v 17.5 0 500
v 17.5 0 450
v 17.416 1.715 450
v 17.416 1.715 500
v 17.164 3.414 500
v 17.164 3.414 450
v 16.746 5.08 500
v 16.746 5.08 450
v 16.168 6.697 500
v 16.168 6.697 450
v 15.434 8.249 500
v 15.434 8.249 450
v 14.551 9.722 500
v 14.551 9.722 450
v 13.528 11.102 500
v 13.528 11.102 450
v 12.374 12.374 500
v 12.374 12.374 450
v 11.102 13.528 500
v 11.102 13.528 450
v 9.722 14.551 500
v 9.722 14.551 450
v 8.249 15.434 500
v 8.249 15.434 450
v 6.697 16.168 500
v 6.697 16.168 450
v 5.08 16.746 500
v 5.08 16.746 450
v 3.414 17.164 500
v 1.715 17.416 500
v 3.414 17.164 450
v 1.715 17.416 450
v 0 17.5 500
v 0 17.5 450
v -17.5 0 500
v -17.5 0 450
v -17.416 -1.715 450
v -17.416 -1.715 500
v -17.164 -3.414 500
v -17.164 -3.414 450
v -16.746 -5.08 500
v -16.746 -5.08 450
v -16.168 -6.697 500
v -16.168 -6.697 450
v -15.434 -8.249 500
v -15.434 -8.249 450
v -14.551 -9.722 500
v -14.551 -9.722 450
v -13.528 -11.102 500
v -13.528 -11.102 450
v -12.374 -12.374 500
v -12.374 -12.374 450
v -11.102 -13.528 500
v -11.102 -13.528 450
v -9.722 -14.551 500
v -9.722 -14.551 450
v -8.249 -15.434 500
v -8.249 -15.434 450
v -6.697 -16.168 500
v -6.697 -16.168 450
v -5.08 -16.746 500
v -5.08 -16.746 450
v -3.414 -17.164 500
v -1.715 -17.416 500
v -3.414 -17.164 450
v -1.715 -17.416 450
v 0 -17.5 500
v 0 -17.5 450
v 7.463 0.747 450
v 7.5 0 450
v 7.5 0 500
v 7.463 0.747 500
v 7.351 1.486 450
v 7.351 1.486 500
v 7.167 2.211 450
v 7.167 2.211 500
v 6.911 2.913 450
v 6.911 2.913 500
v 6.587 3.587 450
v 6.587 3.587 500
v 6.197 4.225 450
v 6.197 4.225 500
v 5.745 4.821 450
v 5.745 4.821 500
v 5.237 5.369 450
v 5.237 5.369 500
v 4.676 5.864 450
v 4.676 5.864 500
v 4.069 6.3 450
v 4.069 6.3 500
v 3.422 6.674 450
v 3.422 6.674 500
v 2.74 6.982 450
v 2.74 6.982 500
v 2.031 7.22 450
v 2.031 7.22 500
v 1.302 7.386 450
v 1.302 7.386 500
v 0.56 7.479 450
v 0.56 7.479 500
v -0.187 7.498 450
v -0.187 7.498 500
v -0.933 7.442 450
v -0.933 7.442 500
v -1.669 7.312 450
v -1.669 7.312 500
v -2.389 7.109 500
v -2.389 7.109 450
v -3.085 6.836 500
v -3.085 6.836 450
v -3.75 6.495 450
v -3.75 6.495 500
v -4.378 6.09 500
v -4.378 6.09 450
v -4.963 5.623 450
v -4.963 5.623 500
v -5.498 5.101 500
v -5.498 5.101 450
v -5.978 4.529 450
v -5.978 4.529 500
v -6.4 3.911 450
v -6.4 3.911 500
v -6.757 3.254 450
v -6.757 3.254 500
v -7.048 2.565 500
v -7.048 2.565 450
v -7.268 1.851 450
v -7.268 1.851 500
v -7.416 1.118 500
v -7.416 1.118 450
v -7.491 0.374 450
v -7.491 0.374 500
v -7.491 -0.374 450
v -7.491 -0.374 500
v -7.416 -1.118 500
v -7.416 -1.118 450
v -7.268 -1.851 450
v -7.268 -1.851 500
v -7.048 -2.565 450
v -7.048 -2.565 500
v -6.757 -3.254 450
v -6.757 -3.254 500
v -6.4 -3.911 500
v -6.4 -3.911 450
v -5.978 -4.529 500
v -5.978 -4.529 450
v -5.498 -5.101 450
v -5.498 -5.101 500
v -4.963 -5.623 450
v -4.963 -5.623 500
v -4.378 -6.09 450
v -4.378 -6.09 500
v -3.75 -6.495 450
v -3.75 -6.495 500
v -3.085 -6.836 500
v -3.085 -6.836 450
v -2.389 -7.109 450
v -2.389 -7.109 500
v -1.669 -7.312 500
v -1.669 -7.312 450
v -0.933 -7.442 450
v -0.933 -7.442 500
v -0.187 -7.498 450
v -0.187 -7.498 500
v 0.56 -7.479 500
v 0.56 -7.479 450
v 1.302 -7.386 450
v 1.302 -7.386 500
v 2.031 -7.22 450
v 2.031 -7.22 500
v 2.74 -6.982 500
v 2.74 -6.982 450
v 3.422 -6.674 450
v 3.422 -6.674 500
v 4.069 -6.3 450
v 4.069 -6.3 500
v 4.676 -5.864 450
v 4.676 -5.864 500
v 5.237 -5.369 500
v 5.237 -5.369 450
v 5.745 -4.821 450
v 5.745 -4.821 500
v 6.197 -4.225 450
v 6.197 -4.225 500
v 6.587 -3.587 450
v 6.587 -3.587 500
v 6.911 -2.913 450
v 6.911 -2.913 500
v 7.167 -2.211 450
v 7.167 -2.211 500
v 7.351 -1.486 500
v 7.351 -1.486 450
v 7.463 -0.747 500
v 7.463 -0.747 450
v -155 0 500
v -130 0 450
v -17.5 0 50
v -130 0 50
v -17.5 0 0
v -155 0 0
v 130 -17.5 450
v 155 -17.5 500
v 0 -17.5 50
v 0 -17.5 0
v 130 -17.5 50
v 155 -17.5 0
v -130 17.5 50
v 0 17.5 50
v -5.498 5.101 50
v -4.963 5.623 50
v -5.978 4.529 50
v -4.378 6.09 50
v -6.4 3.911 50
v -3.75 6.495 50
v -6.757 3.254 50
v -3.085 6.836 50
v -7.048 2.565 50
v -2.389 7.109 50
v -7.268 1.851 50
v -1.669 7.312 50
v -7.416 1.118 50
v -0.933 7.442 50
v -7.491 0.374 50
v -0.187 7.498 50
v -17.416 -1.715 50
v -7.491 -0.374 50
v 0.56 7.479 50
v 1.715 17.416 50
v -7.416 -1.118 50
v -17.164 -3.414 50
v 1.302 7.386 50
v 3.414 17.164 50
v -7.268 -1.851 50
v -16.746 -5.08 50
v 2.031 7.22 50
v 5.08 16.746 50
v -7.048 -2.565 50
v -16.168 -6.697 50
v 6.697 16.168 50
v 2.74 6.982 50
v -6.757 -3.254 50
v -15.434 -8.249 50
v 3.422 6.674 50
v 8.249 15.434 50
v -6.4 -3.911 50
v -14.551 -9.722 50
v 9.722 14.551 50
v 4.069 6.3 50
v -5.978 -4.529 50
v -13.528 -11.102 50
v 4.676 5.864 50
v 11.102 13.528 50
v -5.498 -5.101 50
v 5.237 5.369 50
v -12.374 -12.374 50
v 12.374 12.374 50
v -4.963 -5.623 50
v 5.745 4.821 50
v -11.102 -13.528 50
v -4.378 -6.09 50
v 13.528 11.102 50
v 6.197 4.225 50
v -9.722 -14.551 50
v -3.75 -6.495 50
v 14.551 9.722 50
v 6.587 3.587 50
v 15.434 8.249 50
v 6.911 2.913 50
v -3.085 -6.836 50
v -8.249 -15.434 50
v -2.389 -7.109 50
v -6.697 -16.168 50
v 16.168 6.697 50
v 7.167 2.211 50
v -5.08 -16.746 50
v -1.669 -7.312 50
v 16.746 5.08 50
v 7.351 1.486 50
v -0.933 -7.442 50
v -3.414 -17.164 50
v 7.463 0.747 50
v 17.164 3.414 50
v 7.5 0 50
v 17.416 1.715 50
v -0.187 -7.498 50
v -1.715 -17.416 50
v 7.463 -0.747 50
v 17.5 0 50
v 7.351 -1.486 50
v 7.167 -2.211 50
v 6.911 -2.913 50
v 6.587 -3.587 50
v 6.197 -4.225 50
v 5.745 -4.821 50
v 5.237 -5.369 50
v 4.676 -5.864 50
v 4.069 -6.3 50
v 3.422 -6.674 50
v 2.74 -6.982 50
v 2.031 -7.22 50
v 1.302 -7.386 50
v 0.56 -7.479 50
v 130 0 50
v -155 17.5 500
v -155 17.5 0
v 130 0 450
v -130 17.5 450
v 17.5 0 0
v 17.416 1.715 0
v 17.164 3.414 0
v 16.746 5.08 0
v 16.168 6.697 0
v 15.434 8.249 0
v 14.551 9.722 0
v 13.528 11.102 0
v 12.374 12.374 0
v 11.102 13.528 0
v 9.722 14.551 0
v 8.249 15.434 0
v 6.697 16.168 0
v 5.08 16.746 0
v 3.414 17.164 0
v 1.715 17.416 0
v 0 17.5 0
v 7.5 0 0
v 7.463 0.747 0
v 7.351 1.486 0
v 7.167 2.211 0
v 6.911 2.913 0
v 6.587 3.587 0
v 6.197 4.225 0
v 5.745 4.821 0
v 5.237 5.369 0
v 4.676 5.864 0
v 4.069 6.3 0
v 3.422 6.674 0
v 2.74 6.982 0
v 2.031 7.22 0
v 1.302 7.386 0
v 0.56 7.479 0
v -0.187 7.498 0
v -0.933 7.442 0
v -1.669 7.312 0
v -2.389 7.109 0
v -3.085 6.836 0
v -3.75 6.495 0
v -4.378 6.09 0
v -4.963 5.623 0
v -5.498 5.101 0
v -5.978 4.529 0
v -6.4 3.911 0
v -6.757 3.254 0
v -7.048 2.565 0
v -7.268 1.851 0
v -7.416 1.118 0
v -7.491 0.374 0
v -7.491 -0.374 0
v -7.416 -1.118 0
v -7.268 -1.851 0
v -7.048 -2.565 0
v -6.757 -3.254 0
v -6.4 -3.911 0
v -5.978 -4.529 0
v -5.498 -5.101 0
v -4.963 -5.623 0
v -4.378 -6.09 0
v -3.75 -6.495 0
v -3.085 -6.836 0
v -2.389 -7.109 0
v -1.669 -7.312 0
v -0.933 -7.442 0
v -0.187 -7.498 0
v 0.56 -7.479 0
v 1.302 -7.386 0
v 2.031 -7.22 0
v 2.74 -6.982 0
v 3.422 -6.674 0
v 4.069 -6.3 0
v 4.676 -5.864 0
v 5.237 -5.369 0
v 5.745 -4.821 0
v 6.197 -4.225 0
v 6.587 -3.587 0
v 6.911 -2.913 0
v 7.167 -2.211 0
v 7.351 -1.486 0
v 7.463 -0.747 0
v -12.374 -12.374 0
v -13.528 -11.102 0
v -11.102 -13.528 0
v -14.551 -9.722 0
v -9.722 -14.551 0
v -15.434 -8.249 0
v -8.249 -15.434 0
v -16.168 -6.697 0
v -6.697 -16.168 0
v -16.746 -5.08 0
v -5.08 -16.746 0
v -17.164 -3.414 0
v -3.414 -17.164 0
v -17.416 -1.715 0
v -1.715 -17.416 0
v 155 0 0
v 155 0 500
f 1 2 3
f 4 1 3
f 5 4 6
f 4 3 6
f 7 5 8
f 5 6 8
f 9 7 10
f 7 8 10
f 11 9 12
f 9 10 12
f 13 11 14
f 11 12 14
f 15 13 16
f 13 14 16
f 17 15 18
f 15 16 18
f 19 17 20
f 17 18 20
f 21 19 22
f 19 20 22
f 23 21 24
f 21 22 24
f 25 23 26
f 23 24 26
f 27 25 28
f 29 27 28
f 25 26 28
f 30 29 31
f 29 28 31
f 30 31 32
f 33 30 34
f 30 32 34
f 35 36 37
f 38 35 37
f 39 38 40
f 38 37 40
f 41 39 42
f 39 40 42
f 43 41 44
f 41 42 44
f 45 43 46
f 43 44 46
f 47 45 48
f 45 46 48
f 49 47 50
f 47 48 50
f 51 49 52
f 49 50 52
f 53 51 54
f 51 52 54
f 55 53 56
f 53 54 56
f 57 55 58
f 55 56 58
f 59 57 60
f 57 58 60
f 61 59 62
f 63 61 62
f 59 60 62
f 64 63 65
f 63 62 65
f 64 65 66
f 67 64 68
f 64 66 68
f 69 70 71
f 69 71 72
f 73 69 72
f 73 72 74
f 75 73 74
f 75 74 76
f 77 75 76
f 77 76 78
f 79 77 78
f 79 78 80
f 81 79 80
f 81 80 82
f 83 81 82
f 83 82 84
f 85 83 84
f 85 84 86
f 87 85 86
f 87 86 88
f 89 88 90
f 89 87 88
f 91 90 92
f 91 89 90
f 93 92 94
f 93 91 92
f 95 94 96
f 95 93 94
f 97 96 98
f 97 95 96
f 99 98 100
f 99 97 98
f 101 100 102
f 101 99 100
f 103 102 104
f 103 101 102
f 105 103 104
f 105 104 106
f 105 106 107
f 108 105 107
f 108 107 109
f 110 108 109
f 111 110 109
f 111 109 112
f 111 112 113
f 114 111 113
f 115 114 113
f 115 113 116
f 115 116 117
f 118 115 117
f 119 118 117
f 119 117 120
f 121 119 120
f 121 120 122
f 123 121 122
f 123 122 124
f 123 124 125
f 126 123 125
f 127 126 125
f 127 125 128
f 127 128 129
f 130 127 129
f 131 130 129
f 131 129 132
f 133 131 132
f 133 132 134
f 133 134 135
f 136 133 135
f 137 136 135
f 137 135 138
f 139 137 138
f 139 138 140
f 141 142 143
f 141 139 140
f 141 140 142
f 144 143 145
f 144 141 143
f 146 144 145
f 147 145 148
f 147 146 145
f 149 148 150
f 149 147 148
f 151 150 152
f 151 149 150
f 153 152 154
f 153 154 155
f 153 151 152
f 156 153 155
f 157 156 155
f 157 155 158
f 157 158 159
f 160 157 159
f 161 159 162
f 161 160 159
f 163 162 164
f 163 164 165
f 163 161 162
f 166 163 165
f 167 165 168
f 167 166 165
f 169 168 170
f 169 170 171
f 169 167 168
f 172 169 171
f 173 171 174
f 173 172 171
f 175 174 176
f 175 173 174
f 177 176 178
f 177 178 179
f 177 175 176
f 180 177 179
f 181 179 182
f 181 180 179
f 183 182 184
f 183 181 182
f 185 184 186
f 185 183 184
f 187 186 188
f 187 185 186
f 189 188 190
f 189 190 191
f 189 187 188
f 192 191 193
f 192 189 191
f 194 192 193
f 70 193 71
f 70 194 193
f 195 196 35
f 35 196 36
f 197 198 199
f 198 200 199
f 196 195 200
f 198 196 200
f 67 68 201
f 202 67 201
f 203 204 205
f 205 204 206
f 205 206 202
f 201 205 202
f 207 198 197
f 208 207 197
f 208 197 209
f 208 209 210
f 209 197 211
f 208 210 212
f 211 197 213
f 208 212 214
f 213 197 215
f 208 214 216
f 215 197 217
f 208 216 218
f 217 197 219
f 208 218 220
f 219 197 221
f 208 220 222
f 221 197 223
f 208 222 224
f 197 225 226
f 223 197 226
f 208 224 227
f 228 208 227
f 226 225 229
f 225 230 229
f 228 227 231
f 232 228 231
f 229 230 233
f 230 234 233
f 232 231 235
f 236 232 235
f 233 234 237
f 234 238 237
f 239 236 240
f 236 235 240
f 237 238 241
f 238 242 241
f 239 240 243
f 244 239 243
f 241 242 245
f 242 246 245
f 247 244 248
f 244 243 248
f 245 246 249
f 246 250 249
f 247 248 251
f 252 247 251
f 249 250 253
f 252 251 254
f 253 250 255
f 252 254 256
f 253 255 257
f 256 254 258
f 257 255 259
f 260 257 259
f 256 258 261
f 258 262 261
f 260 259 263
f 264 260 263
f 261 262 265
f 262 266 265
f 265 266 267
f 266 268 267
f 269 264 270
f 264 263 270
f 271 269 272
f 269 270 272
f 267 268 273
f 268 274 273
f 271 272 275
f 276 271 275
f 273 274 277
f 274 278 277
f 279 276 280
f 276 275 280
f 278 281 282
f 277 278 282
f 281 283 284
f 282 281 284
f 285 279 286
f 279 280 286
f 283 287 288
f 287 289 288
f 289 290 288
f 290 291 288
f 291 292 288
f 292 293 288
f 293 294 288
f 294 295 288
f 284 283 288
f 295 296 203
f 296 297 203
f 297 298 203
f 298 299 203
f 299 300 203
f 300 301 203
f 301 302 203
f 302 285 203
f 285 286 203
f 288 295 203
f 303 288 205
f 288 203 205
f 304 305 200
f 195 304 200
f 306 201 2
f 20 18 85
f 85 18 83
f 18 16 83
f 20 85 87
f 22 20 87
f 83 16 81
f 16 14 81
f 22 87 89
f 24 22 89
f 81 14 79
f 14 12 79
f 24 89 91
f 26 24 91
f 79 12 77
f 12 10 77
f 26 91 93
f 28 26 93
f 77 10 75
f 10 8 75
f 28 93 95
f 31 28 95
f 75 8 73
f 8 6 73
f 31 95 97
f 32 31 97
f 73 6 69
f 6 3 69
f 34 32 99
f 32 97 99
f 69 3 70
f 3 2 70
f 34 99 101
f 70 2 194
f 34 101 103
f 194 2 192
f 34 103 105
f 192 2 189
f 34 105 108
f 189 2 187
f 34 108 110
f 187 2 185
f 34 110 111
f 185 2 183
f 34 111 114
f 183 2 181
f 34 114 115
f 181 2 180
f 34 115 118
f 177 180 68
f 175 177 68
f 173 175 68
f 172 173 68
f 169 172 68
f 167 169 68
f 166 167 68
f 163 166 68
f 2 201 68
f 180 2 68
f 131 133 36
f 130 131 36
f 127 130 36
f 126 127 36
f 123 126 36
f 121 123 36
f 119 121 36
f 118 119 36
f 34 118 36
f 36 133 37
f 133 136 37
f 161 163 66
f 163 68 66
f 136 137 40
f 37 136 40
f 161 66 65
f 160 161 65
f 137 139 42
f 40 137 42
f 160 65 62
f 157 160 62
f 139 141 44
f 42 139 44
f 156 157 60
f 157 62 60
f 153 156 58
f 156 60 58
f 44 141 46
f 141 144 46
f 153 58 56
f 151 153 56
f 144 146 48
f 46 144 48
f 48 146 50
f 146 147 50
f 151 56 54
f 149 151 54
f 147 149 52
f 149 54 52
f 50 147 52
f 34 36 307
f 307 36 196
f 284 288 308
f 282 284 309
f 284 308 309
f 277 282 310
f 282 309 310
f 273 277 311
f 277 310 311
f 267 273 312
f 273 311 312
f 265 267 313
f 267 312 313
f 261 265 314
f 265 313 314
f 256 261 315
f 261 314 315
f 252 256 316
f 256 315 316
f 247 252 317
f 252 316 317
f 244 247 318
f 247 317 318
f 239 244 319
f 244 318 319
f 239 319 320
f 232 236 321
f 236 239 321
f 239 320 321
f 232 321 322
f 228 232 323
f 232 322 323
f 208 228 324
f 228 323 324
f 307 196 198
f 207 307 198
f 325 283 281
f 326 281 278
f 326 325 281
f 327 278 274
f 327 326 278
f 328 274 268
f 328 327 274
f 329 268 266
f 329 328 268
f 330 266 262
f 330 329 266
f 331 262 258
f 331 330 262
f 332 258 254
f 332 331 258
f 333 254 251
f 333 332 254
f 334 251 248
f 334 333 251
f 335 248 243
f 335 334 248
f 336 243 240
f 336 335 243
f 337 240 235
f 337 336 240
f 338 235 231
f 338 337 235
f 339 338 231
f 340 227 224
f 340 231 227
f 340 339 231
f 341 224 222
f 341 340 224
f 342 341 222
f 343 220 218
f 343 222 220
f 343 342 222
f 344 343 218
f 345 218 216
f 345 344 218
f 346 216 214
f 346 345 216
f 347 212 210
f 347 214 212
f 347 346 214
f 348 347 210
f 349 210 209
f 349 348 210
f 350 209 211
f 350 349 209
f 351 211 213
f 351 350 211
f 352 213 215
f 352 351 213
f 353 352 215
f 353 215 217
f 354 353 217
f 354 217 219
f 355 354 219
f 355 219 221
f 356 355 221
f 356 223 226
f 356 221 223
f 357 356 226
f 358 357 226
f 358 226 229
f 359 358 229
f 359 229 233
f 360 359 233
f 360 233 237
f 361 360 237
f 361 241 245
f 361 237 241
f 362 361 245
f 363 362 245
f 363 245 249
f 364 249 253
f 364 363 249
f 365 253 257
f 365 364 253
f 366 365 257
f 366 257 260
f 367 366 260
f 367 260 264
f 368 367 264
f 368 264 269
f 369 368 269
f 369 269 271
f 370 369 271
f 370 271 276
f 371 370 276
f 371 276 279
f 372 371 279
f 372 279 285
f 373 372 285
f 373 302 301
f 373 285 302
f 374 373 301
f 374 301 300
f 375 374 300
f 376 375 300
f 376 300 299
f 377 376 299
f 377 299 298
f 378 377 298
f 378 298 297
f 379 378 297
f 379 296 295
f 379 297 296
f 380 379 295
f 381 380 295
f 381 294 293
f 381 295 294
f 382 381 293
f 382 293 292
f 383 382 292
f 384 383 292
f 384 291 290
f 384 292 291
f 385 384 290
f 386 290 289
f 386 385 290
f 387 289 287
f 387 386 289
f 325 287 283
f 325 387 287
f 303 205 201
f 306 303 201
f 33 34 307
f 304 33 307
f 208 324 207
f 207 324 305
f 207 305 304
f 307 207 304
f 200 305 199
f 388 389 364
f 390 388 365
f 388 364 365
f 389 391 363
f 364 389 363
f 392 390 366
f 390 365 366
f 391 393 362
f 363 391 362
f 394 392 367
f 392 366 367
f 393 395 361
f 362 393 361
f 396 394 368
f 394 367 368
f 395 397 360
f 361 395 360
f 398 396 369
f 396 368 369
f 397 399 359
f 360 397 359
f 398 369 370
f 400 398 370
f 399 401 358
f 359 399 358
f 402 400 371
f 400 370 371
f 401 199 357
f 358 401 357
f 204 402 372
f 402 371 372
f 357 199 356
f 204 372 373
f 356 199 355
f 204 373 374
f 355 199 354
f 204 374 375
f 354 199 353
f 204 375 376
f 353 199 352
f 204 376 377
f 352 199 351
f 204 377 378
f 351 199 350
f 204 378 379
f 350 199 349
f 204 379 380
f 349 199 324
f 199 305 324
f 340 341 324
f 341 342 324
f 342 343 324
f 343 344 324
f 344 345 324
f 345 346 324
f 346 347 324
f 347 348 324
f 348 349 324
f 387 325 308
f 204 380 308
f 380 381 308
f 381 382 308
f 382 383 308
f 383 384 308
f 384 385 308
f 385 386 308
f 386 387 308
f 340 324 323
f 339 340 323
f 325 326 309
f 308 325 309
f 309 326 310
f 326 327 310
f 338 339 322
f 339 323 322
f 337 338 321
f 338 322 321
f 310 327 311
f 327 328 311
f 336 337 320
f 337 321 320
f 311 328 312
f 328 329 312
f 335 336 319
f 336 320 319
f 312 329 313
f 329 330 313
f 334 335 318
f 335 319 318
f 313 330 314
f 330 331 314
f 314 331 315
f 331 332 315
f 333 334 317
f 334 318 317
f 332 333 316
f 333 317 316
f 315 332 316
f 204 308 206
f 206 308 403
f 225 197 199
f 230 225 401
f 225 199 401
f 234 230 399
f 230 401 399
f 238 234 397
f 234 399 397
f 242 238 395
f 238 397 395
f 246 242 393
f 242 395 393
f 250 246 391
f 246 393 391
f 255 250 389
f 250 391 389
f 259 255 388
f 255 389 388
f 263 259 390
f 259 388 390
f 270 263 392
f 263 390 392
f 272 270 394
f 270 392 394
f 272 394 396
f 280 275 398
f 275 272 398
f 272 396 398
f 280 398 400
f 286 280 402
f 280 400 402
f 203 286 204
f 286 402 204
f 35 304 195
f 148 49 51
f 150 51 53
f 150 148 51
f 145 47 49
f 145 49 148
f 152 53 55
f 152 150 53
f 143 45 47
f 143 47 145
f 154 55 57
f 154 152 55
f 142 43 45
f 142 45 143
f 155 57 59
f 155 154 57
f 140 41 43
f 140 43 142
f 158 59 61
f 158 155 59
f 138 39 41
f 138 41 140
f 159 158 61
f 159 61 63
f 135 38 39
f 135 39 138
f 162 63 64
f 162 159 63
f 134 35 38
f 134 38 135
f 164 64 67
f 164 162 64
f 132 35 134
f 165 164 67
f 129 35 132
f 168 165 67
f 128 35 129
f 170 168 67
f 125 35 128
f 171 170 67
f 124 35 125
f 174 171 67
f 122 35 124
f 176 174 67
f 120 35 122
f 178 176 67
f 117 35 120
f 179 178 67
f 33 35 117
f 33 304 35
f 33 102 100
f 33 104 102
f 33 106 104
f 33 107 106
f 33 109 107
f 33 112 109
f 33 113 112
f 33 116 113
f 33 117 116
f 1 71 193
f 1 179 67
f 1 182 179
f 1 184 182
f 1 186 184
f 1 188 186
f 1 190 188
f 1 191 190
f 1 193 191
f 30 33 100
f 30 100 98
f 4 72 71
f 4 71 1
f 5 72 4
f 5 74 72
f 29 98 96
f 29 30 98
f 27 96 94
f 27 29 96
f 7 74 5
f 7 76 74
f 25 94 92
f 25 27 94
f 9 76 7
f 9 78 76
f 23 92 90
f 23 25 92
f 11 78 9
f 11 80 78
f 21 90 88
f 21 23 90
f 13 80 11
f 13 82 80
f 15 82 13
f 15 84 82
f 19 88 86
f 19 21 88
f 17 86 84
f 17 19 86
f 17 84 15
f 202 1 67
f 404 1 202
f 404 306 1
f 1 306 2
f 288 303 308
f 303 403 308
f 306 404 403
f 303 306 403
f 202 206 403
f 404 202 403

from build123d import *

# Parameters (mm, degrees)
F0_R     = 7.5
F1_DEPTH = 500
F3_DEPTH = 35.001


with BuildPart() as f1:
    # F0 (on Top) → F1 (new body)
    with BuildSketch(Plane.XY):
        with BuildLine():
            Line((-155, 0), (-17.5, 0))
            ThreePointArc((-17.5, 0), (-12.3743686708, -12.3743686708), (0, -17.5))
            Line((0, -17.5), (155, -17.5))
            Line((155, -17.5), (155, 0))
            Line((155, 0), (17.5, 0))
            ThreePointArc((17.5, 0), (12.3743686708, 12.3743686708), (0, 17.5))
            Line((0, 17.5), (-155, 17.5))
            Line((-155, 17.5), (-155, 0))
        make_face()
        Circle(F0_R, mode=Mode.SUBTRACT)
    extrude(amount=F1_DEPTH)

    # F2 (on face) → F3 (cut, through all)
    with BuildSketch(Plane.XZ.offset(17.5)):
        Polygon((-17.5, 450), (-130, 450), (-130, 50), (-17.5, 50), (0, 50), (130, 50), (130, 450), (0, 450), align=None)
    extrude(amount=-F3_DEPTH, mode=Mode.SUBTRACT)


solid = f1.part
